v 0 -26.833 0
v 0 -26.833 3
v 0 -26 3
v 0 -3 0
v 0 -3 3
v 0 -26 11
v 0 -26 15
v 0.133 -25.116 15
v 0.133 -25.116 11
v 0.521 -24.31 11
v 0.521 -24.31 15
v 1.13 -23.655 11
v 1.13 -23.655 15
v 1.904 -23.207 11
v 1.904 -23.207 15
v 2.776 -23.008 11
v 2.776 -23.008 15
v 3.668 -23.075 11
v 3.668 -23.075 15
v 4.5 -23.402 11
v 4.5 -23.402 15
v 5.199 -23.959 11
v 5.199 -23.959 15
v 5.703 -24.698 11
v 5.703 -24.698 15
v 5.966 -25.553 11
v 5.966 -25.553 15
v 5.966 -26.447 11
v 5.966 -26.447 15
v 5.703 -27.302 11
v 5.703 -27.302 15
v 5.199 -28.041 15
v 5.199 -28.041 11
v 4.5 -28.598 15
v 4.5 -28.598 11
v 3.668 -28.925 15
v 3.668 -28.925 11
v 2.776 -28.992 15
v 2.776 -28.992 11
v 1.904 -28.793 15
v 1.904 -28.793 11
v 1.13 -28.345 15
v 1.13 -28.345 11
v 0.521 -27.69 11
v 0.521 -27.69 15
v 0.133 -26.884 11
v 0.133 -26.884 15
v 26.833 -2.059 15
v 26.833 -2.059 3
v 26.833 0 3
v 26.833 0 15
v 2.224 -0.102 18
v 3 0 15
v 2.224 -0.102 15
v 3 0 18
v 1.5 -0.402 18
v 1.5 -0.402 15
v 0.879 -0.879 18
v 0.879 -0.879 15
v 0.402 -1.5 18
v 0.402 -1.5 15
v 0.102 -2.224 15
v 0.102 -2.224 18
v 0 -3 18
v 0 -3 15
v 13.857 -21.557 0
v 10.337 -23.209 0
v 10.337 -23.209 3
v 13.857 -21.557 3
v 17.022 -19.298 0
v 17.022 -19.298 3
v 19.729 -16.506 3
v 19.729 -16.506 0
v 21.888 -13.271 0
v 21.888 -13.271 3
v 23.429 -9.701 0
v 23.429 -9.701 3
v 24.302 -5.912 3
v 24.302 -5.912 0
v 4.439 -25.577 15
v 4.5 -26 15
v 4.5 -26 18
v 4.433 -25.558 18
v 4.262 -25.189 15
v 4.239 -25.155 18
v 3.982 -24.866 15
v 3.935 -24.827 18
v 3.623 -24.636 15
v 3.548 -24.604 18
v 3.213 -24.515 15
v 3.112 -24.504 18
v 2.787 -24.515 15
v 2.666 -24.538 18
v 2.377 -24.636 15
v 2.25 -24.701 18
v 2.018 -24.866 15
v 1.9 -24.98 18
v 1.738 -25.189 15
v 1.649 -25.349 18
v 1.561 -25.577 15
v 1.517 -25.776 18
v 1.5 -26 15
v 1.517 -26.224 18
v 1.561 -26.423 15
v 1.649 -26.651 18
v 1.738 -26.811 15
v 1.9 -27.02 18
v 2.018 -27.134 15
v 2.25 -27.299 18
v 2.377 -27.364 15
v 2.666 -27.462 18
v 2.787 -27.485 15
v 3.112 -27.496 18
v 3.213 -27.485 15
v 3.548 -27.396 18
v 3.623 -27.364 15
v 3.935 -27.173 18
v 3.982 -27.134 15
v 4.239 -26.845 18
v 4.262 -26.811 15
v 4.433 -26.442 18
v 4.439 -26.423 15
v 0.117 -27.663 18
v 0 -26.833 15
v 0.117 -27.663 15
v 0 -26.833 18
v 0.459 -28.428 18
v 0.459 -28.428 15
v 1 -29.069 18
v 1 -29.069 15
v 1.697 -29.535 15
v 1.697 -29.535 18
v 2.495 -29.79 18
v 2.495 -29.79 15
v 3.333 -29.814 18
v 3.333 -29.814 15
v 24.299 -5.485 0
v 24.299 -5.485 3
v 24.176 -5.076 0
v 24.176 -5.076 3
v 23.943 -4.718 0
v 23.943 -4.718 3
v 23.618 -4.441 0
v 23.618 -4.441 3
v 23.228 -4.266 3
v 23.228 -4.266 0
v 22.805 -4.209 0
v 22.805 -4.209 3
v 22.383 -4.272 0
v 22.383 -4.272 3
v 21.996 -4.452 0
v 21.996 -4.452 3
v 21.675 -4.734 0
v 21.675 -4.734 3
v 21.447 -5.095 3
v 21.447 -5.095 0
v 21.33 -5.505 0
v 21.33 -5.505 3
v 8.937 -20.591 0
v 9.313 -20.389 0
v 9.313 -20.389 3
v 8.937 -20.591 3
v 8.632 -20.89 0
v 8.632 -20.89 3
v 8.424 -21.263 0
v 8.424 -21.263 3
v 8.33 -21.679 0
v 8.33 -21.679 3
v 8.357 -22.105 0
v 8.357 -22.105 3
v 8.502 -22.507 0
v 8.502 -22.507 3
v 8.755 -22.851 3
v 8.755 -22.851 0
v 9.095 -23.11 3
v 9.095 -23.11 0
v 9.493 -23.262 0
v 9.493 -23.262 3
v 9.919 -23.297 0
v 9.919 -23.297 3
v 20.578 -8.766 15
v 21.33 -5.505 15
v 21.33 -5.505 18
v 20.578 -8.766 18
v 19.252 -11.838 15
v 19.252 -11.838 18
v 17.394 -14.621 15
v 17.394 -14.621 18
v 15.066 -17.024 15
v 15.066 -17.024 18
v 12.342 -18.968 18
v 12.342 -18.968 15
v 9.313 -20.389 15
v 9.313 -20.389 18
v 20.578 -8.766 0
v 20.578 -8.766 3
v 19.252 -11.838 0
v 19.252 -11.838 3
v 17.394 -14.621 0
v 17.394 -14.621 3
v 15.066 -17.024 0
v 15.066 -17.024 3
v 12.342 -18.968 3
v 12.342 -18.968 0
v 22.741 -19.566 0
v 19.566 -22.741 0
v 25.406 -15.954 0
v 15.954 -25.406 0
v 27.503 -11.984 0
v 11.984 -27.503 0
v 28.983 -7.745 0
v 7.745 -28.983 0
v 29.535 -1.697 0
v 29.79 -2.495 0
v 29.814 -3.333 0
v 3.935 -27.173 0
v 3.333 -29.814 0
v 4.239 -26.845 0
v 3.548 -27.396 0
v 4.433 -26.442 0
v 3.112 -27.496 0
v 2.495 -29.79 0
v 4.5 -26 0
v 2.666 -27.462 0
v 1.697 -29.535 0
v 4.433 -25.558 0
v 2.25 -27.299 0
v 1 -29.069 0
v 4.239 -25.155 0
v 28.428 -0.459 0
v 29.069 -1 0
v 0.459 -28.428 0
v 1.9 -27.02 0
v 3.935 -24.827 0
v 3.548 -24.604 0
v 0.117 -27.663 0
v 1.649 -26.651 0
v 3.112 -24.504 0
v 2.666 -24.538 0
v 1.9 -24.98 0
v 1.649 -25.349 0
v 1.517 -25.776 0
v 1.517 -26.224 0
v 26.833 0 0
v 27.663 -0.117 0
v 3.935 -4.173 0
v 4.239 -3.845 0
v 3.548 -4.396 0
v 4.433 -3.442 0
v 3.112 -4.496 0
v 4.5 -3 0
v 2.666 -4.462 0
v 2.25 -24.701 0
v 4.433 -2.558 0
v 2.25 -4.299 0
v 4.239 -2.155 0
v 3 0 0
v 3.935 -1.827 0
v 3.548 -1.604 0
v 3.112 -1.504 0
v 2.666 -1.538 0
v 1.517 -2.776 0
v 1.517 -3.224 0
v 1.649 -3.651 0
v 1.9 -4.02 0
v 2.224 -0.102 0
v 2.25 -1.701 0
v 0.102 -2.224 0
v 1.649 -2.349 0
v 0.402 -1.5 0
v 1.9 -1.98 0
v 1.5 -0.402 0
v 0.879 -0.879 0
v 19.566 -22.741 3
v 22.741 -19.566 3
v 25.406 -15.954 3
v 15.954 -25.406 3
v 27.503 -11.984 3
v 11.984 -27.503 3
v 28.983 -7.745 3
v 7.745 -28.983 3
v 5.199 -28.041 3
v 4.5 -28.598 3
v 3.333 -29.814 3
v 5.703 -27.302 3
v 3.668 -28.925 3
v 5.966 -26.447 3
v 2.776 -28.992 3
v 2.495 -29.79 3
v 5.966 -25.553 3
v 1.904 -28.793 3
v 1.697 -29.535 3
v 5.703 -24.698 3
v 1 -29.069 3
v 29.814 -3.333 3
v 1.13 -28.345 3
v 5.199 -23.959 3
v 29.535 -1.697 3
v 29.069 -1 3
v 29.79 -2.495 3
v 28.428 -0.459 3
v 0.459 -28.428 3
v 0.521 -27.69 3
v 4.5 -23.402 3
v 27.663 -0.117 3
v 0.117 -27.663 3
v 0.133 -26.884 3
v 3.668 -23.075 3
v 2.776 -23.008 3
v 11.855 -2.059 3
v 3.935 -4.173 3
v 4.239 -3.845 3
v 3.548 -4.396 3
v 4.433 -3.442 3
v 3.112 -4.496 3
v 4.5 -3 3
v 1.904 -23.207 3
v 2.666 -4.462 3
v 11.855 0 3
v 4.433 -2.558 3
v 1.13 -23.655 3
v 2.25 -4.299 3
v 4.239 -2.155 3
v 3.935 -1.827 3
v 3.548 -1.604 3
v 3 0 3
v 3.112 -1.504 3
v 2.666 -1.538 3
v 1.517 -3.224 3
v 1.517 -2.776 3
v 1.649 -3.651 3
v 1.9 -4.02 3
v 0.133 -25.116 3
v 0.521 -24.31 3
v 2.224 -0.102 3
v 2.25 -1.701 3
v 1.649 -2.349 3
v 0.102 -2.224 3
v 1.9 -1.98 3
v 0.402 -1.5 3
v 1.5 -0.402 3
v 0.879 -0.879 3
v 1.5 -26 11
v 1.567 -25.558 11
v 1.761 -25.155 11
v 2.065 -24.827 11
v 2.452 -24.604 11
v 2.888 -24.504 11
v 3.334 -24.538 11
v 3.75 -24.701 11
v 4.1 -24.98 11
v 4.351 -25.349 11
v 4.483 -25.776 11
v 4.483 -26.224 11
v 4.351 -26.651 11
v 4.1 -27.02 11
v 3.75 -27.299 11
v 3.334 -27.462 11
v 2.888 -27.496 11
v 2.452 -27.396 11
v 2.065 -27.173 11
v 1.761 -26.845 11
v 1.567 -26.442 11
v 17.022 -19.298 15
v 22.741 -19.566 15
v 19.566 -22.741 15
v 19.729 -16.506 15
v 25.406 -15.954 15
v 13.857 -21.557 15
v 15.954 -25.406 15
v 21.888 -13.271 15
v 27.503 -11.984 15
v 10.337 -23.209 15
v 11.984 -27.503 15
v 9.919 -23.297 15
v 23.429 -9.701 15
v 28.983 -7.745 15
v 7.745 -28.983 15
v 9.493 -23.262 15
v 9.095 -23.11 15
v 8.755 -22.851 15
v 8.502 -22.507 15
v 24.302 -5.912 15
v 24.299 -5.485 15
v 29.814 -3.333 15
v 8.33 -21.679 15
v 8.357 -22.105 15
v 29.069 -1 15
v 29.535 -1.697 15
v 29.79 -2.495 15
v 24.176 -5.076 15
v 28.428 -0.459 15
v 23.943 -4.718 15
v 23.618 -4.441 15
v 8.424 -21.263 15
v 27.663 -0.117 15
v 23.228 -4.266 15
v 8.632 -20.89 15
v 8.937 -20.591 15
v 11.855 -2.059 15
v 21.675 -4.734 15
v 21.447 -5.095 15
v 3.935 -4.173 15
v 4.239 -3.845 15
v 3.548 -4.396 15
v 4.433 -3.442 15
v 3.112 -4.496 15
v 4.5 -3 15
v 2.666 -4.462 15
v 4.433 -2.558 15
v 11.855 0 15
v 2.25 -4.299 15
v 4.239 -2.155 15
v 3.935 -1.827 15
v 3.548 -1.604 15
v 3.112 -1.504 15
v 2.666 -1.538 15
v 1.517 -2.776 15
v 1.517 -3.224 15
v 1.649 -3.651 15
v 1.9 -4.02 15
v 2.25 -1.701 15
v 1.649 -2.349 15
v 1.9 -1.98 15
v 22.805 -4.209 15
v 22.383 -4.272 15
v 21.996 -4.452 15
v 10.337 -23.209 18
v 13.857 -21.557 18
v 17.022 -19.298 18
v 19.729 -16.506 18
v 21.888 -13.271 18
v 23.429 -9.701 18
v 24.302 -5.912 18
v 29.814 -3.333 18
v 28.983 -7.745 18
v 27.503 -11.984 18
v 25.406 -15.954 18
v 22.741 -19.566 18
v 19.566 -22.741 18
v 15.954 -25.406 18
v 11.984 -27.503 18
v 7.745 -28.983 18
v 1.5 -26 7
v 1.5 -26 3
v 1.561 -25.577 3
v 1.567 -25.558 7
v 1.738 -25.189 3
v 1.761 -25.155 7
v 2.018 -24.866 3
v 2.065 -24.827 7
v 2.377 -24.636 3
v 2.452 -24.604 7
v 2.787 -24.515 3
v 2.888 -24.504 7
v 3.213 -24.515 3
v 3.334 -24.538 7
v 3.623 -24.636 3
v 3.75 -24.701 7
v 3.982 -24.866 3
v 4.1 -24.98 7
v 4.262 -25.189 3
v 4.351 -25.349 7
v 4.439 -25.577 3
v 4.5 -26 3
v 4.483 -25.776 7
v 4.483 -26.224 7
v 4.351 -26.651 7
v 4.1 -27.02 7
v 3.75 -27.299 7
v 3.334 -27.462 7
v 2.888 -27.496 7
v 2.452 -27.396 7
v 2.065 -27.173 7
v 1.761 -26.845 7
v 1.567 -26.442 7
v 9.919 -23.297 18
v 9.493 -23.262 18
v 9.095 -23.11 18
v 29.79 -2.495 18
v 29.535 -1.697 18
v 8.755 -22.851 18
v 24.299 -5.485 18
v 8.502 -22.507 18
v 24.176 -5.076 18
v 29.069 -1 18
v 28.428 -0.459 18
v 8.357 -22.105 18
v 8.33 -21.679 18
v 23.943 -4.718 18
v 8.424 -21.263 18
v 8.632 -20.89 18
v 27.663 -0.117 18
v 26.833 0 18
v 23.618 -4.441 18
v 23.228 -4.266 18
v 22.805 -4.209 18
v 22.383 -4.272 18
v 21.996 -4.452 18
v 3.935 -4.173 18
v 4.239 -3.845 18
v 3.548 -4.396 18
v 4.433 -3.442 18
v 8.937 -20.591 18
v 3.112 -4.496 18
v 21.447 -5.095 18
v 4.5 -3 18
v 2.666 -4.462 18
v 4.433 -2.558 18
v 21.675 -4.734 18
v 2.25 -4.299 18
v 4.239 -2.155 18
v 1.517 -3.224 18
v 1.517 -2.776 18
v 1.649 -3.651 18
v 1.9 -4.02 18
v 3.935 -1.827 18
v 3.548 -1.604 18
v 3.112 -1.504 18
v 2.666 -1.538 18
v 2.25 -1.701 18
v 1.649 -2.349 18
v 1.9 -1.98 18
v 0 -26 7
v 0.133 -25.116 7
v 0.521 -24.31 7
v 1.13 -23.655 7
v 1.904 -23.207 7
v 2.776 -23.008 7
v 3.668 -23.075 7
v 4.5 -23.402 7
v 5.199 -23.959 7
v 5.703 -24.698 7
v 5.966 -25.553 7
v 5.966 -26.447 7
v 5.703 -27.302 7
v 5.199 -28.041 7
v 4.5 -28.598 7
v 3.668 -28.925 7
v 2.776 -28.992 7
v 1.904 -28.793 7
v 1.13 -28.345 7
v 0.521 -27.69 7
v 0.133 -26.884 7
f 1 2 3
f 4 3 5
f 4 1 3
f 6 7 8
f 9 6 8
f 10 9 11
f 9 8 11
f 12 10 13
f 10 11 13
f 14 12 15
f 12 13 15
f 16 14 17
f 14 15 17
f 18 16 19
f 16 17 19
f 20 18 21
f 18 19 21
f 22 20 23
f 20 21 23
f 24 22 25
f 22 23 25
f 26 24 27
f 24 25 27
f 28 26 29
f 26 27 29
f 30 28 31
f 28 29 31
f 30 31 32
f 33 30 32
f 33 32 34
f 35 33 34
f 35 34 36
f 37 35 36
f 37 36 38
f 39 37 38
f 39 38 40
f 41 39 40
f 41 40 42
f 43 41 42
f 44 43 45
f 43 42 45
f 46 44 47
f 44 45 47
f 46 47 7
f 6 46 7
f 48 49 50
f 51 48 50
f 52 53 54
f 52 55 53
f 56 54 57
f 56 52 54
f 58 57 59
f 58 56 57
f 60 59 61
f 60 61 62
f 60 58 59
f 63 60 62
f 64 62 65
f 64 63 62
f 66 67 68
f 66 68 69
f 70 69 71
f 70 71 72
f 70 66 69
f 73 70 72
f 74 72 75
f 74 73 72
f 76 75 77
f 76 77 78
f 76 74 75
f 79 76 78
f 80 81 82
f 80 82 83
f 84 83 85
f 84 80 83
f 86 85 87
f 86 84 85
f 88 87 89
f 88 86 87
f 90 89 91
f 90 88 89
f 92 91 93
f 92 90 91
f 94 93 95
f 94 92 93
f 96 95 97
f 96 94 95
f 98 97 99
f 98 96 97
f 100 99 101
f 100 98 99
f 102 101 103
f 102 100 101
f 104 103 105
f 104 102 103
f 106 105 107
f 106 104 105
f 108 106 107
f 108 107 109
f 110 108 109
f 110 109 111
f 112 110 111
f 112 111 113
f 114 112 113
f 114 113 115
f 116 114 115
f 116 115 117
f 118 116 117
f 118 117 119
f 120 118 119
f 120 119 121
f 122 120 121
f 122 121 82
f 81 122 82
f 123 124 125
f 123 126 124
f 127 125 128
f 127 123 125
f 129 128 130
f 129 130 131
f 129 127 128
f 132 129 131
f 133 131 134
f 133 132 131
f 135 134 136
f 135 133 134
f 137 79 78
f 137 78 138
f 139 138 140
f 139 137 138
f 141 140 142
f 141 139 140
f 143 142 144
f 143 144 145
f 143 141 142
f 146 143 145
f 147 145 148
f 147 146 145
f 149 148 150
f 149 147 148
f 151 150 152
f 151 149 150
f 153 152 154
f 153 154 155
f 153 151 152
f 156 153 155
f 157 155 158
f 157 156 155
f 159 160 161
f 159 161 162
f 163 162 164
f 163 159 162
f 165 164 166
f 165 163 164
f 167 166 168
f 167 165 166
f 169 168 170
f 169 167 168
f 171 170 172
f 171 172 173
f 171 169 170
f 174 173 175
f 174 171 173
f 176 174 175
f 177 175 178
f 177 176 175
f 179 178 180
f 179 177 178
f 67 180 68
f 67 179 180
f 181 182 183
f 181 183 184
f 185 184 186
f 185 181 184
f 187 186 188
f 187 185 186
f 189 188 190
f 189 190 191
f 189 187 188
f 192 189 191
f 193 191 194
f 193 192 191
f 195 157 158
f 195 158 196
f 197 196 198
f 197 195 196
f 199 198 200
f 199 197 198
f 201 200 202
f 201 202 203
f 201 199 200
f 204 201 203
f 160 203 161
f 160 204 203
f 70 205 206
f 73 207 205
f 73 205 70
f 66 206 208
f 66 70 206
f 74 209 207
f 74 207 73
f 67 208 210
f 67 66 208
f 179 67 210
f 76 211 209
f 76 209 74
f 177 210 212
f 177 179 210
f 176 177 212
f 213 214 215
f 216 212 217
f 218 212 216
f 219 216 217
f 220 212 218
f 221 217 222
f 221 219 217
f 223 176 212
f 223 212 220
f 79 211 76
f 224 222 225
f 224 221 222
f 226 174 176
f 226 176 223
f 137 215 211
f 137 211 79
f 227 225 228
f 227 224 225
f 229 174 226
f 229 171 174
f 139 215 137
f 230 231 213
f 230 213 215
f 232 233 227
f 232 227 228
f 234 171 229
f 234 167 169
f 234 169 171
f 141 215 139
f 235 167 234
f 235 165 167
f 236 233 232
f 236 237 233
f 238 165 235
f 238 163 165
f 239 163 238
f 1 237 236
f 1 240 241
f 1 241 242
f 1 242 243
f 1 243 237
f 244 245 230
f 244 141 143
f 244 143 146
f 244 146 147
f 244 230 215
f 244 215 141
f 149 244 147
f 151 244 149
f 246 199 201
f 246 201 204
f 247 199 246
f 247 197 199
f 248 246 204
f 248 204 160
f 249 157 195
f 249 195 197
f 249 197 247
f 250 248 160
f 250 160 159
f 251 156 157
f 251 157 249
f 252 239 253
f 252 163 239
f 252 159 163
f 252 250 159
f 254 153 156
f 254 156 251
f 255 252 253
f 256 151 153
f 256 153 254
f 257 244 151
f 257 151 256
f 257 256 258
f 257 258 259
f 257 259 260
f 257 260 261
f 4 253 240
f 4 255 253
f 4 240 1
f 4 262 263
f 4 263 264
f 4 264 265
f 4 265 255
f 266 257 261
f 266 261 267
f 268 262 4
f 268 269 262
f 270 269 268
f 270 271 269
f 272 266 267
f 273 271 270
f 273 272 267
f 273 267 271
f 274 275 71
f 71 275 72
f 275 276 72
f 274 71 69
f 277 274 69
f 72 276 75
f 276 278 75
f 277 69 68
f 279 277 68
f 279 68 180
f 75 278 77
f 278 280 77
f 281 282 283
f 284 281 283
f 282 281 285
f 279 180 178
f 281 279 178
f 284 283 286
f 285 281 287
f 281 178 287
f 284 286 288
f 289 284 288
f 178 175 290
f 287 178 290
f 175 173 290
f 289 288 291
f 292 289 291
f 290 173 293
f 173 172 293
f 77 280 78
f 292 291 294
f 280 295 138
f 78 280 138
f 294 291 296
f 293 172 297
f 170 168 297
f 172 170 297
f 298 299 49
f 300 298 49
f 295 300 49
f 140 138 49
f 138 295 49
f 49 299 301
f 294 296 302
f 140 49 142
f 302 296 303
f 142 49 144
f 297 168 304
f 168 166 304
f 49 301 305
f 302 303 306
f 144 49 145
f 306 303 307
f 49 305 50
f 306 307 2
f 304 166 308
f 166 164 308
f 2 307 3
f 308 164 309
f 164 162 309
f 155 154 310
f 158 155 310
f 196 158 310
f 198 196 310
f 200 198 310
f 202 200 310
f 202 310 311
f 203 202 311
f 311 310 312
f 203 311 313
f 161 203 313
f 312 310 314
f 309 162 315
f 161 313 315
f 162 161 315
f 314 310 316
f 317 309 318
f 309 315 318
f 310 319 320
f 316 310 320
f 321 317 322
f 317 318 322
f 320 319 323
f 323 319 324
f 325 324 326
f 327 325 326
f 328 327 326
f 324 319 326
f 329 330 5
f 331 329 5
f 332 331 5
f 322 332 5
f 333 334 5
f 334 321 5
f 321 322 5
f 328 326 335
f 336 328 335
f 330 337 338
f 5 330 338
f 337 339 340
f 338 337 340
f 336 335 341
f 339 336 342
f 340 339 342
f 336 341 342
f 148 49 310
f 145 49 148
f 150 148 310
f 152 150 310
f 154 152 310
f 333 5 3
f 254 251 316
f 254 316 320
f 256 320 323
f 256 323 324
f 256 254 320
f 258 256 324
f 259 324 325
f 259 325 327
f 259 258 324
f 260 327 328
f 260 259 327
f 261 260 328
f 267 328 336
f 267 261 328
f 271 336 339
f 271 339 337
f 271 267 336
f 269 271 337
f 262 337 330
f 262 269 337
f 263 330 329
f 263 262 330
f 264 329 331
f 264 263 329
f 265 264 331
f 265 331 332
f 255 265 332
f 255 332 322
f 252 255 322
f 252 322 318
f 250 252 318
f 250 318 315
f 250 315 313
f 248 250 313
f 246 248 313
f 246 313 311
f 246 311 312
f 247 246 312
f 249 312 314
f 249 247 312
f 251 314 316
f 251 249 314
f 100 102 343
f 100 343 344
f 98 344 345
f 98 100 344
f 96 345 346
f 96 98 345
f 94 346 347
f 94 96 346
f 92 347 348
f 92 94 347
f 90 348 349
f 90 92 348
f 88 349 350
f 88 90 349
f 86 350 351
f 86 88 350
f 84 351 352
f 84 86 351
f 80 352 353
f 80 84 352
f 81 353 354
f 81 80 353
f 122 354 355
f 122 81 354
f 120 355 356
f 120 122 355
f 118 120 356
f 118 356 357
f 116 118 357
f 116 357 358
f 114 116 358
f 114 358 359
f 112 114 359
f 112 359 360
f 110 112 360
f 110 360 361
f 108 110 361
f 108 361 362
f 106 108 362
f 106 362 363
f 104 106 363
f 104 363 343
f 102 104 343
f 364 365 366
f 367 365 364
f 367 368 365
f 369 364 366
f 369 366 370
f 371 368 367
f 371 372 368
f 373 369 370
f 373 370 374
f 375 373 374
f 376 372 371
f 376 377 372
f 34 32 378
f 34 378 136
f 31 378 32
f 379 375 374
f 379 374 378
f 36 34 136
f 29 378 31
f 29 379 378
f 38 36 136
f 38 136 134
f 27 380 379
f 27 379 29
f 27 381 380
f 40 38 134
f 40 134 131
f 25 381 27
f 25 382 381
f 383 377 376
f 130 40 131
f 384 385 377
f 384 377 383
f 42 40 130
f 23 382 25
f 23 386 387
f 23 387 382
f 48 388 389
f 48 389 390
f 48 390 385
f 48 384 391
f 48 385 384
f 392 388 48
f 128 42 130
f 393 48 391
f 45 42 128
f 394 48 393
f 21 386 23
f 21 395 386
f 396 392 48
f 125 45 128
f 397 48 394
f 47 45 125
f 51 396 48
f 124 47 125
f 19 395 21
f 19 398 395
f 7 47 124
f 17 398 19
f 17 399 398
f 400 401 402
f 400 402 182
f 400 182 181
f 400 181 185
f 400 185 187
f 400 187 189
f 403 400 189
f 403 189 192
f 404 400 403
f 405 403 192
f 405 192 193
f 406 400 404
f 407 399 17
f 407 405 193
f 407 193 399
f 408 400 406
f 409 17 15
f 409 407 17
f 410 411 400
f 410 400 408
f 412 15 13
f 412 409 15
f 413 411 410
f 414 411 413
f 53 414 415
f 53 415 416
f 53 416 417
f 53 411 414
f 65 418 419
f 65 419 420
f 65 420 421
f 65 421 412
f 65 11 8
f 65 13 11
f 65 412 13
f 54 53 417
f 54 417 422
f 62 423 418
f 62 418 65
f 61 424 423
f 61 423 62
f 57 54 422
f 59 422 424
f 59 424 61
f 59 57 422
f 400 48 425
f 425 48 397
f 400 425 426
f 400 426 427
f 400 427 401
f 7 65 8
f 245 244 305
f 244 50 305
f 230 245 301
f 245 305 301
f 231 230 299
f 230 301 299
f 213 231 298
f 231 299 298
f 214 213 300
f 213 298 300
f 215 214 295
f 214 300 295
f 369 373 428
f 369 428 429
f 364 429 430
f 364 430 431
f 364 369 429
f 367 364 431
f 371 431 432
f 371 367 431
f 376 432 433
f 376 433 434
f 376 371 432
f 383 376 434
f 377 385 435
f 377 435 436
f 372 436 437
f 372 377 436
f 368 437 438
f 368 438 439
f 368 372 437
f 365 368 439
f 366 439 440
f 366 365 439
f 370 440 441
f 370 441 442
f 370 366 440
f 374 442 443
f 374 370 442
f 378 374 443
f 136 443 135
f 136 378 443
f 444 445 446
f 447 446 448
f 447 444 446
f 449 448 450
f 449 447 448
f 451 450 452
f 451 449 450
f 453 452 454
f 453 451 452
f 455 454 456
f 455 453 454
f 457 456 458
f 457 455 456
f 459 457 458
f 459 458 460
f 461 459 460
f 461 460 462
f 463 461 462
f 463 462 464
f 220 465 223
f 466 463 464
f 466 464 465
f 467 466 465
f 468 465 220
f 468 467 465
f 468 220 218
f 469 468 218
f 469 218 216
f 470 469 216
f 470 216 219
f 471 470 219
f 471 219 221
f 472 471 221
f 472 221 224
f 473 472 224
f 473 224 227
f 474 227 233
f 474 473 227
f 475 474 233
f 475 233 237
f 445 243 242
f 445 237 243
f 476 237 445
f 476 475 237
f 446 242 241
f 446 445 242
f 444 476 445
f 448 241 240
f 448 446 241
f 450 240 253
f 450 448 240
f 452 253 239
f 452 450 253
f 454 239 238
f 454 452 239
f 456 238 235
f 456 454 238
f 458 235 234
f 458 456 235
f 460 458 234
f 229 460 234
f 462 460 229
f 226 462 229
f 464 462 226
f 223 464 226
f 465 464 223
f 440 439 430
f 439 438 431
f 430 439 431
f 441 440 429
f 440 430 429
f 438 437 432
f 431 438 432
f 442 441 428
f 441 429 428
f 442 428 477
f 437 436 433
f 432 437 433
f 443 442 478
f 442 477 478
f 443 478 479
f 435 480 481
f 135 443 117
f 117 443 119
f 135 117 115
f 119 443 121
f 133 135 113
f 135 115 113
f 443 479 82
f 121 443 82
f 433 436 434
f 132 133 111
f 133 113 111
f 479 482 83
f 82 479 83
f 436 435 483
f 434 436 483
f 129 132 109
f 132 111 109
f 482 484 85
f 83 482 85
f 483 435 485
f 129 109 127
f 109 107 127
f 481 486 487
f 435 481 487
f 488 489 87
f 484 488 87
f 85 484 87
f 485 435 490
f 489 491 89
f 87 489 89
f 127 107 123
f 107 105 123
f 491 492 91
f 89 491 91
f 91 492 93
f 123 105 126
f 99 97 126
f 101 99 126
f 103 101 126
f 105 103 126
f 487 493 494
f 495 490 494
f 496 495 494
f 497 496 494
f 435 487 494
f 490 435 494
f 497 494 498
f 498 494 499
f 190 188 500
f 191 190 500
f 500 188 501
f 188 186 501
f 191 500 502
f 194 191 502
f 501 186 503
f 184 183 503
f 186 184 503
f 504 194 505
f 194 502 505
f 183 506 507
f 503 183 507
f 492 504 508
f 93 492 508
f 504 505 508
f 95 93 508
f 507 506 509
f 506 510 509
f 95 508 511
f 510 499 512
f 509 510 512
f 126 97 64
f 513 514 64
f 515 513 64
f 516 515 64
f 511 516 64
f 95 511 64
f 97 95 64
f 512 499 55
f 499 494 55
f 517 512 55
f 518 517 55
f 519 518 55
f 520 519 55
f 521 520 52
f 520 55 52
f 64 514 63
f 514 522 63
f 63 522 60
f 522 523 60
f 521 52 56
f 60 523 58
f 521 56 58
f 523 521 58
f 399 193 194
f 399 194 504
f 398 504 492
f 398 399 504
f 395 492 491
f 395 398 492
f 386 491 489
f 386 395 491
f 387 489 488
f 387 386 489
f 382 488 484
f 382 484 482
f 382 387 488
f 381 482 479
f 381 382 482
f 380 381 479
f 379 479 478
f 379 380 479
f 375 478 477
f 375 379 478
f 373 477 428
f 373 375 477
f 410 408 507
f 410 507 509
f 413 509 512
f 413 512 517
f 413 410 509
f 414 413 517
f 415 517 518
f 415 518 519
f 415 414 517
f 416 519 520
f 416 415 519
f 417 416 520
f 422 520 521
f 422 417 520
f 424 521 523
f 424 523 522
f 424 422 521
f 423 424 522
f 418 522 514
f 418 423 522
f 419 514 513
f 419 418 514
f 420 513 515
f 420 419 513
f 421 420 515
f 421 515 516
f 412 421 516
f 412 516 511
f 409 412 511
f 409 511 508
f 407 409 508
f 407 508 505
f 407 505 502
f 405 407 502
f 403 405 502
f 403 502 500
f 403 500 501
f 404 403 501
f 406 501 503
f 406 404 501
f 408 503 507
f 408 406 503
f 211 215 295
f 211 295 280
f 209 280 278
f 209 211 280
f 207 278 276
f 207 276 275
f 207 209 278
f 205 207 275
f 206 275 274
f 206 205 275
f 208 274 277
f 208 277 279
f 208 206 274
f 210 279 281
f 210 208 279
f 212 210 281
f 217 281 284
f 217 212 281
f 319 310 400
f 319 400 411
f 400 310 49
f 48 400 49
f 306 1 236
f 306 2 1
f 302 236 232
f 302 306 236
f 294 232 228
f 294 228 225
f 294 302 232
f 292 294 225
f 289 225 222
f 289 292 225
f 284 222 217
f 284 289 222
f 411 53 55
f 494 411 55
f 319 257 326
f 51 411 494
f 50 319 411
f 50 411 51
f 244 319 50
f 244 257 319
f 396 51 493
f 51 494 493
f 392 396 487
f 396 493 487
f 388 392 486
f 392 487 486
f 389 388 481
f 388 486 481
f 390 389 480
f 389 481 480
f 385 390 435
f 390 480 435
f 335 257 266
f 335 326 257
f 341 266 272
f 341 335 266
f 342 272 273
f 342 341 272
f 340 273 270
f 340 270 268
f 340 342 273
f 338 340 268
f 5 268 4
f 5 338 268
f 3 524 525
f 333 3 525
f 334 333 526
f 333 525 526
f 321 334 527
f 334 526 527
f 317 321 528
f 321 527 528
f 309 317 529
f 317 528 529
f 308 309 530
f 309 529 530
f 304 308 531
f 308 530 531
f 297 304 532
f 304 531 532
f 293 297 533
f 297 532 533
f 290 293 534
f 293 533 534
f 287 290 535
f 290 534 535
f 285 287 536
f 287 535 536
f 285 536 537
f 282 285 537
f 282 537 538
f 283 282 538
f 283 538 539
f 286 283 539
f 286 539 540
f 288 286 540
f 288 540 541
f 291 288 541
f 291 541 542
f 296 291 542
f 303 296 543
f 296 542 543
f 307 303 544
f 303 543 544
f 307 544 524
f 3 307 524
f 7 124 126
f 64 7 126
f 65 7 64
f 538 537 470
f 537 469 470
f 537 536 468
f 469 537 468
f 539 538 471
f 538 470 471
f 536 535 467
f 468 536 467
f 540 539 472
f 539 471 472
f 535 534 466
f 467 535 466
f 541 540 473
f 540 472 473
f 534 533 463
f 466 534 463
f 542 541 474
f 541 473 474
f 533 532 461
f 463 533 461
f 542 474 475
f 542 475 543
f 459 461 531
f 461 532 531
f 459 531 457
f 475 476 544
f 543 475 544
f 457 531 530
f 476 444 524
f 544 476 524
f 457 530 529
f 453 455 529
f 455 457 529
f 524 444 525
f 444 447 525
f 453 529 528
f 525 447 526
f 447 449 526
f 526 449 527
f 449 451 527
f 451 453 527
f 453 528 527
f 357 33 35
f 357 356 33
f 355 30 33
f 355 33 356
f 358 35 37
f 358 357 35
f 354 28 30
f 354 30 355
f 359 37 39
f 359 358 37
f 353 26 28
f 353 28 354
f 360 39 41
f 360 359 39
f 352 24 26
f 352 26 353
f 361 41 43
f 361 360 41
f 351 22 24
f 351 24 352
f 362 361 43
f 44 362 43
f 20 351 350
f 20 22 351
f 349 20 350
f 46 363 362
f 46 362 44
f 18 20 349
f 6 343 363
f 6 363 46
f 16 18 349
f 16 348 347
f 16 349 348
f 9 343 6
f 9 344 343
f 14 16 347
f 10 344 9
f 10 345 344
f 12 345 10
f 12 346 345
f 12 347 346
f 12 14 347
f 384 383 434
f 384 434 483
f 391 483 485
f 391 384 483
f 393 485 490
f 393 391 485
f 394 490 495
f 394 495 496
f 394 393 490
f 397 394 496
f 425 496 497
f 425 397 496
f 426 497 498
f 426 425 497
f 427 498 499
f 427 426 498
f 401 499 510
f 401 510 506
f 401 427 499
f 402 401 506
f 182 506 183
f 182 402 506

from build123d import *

# Parameters (mm, degrees)
SKETCH1_R           = 1.5
BOSS_EXTRUDE1_DEPTH = 3
LPATTERN1_COUNT     = 2
LPATTERN1_PITCH     = 15
FILLET2_R           = 3
FILLET3_R           = 3
SKETCH2_W           = 14.977515773
SKETCH2_H           = 2.058823846
BOSS_EXTRUDE2_DEPTH = 15
SKETCH3_R           = 3
SKETCH3_R_2         = 1.5
BOSS_EXTRUDE3_DEPTH = 4
LPATTERN2_COUNT     = 2
LPATTERN2_PITCH     = 8


with BuildPart() as part:
    # Sketch1 → Boss-Extrude1 (new body)
    with BuildSketch(Plane.XY):
        with BuildLine():
            Line((0, 0), (30, 0))
            ThreePointArc((30, 0), (21.213203436, -21.213203436), (0, -30))
            Line((0, -30), (0, 0))
        make_face()
        with Locations((3, -26)):
            Circle(SKETCH1_R, mode=Mode.SUBTRACT)
        with Locations((3, -3)):
            Circle(SKETCH1_R, mode=Mode.SUBTRACT)
        with BuildLine():
            ThreePointArc((21.329556778, -5.505463694), (17.394405246, -14.621148722), (9.313112731, -20.38949705))
            ThreePointArc((9.313112731, -20.38949705), (8.415027516, -22.311330275), (10.336860742, -23.20941549))
            ThreePointArc((10.336860742, -23.20941549), (19.728633123, -16.505659326), (24.301917337, -5.911755103))
            ThreePointArc((24.301917337, -5.911755103), (23.018882762, -4.222429119), (21.329556778, -5.505463694))
        make_face(mode=Mode.SUBTRACT)
    extrude(amount=BOSS_EXTRUDE1_DEPTH)


with BuildPart() as lpattern1_1:
    # LPattern1: pattern copy
    add(part.part.moved(Location(Vector(0, 0, 1) * (1 * LPATTERN1_PITCH))))

    # Fillet3
    fillet3_edges = [lpattern1_1.edges().sort_by_distance(p)[0] for p in [
        (0, 0, 16.5),
        (30, 0, 16.5),
        (0, -30, 16.5),
    ]]
    fillet(fillet3_edges, radius=FILLET3_R)


with BuildPart() as part_1:
    add(part.part)

    # Fillet2
    fillet2_edges = [part_1.edges().sort_by_distance(p)[0] for p in [
        (0, 0, 1.5),
        (30, 0, 1.5),
        (0, -30, 1.5),
    ]]
    fillet(fillet2_edges, radius=FILLET2_R)

    add(lpattern1_1.part)  # Boss-Extrude2 merges LPattern1_1
    # Sketch2 → Boss-Extrude2 (add)
    with BuildSketch(Plane.XY.offset(3)):
        with Locations((19.344057843, -1.029411923)):
            Rectangle(SKETCH2_W, SKETCH2_H)
    extrude(amount=BOSS_EXTRUDE2_DEPTH)

    # Sketch3 → Boss-Extrude3 (add)
    with BuildSketch(Plane(origin=(0, 0, 15), x_dir=(-1, 0, 0), z_dir=(0, 0, -1))):
        with Locations((-3, -26)):
            Circle(SKETCH3_R)
        with Locations((-3, -26)):
            Circle(SKETCH3_R_2, mode=Mode.SUBTRACT)
    boss_extrude3 = extrude(amount=BOSS_EXTRUDE3_DEPTH)

    # LPattern2: Boss-Extrude3 ×2
    with Locations(*[(0, 0, -i * LPATTERN2_PITCH) for i in range(1, LPATTERN2_COUNT)]):
        add(boss_extrude3)


solid = part_1.part
